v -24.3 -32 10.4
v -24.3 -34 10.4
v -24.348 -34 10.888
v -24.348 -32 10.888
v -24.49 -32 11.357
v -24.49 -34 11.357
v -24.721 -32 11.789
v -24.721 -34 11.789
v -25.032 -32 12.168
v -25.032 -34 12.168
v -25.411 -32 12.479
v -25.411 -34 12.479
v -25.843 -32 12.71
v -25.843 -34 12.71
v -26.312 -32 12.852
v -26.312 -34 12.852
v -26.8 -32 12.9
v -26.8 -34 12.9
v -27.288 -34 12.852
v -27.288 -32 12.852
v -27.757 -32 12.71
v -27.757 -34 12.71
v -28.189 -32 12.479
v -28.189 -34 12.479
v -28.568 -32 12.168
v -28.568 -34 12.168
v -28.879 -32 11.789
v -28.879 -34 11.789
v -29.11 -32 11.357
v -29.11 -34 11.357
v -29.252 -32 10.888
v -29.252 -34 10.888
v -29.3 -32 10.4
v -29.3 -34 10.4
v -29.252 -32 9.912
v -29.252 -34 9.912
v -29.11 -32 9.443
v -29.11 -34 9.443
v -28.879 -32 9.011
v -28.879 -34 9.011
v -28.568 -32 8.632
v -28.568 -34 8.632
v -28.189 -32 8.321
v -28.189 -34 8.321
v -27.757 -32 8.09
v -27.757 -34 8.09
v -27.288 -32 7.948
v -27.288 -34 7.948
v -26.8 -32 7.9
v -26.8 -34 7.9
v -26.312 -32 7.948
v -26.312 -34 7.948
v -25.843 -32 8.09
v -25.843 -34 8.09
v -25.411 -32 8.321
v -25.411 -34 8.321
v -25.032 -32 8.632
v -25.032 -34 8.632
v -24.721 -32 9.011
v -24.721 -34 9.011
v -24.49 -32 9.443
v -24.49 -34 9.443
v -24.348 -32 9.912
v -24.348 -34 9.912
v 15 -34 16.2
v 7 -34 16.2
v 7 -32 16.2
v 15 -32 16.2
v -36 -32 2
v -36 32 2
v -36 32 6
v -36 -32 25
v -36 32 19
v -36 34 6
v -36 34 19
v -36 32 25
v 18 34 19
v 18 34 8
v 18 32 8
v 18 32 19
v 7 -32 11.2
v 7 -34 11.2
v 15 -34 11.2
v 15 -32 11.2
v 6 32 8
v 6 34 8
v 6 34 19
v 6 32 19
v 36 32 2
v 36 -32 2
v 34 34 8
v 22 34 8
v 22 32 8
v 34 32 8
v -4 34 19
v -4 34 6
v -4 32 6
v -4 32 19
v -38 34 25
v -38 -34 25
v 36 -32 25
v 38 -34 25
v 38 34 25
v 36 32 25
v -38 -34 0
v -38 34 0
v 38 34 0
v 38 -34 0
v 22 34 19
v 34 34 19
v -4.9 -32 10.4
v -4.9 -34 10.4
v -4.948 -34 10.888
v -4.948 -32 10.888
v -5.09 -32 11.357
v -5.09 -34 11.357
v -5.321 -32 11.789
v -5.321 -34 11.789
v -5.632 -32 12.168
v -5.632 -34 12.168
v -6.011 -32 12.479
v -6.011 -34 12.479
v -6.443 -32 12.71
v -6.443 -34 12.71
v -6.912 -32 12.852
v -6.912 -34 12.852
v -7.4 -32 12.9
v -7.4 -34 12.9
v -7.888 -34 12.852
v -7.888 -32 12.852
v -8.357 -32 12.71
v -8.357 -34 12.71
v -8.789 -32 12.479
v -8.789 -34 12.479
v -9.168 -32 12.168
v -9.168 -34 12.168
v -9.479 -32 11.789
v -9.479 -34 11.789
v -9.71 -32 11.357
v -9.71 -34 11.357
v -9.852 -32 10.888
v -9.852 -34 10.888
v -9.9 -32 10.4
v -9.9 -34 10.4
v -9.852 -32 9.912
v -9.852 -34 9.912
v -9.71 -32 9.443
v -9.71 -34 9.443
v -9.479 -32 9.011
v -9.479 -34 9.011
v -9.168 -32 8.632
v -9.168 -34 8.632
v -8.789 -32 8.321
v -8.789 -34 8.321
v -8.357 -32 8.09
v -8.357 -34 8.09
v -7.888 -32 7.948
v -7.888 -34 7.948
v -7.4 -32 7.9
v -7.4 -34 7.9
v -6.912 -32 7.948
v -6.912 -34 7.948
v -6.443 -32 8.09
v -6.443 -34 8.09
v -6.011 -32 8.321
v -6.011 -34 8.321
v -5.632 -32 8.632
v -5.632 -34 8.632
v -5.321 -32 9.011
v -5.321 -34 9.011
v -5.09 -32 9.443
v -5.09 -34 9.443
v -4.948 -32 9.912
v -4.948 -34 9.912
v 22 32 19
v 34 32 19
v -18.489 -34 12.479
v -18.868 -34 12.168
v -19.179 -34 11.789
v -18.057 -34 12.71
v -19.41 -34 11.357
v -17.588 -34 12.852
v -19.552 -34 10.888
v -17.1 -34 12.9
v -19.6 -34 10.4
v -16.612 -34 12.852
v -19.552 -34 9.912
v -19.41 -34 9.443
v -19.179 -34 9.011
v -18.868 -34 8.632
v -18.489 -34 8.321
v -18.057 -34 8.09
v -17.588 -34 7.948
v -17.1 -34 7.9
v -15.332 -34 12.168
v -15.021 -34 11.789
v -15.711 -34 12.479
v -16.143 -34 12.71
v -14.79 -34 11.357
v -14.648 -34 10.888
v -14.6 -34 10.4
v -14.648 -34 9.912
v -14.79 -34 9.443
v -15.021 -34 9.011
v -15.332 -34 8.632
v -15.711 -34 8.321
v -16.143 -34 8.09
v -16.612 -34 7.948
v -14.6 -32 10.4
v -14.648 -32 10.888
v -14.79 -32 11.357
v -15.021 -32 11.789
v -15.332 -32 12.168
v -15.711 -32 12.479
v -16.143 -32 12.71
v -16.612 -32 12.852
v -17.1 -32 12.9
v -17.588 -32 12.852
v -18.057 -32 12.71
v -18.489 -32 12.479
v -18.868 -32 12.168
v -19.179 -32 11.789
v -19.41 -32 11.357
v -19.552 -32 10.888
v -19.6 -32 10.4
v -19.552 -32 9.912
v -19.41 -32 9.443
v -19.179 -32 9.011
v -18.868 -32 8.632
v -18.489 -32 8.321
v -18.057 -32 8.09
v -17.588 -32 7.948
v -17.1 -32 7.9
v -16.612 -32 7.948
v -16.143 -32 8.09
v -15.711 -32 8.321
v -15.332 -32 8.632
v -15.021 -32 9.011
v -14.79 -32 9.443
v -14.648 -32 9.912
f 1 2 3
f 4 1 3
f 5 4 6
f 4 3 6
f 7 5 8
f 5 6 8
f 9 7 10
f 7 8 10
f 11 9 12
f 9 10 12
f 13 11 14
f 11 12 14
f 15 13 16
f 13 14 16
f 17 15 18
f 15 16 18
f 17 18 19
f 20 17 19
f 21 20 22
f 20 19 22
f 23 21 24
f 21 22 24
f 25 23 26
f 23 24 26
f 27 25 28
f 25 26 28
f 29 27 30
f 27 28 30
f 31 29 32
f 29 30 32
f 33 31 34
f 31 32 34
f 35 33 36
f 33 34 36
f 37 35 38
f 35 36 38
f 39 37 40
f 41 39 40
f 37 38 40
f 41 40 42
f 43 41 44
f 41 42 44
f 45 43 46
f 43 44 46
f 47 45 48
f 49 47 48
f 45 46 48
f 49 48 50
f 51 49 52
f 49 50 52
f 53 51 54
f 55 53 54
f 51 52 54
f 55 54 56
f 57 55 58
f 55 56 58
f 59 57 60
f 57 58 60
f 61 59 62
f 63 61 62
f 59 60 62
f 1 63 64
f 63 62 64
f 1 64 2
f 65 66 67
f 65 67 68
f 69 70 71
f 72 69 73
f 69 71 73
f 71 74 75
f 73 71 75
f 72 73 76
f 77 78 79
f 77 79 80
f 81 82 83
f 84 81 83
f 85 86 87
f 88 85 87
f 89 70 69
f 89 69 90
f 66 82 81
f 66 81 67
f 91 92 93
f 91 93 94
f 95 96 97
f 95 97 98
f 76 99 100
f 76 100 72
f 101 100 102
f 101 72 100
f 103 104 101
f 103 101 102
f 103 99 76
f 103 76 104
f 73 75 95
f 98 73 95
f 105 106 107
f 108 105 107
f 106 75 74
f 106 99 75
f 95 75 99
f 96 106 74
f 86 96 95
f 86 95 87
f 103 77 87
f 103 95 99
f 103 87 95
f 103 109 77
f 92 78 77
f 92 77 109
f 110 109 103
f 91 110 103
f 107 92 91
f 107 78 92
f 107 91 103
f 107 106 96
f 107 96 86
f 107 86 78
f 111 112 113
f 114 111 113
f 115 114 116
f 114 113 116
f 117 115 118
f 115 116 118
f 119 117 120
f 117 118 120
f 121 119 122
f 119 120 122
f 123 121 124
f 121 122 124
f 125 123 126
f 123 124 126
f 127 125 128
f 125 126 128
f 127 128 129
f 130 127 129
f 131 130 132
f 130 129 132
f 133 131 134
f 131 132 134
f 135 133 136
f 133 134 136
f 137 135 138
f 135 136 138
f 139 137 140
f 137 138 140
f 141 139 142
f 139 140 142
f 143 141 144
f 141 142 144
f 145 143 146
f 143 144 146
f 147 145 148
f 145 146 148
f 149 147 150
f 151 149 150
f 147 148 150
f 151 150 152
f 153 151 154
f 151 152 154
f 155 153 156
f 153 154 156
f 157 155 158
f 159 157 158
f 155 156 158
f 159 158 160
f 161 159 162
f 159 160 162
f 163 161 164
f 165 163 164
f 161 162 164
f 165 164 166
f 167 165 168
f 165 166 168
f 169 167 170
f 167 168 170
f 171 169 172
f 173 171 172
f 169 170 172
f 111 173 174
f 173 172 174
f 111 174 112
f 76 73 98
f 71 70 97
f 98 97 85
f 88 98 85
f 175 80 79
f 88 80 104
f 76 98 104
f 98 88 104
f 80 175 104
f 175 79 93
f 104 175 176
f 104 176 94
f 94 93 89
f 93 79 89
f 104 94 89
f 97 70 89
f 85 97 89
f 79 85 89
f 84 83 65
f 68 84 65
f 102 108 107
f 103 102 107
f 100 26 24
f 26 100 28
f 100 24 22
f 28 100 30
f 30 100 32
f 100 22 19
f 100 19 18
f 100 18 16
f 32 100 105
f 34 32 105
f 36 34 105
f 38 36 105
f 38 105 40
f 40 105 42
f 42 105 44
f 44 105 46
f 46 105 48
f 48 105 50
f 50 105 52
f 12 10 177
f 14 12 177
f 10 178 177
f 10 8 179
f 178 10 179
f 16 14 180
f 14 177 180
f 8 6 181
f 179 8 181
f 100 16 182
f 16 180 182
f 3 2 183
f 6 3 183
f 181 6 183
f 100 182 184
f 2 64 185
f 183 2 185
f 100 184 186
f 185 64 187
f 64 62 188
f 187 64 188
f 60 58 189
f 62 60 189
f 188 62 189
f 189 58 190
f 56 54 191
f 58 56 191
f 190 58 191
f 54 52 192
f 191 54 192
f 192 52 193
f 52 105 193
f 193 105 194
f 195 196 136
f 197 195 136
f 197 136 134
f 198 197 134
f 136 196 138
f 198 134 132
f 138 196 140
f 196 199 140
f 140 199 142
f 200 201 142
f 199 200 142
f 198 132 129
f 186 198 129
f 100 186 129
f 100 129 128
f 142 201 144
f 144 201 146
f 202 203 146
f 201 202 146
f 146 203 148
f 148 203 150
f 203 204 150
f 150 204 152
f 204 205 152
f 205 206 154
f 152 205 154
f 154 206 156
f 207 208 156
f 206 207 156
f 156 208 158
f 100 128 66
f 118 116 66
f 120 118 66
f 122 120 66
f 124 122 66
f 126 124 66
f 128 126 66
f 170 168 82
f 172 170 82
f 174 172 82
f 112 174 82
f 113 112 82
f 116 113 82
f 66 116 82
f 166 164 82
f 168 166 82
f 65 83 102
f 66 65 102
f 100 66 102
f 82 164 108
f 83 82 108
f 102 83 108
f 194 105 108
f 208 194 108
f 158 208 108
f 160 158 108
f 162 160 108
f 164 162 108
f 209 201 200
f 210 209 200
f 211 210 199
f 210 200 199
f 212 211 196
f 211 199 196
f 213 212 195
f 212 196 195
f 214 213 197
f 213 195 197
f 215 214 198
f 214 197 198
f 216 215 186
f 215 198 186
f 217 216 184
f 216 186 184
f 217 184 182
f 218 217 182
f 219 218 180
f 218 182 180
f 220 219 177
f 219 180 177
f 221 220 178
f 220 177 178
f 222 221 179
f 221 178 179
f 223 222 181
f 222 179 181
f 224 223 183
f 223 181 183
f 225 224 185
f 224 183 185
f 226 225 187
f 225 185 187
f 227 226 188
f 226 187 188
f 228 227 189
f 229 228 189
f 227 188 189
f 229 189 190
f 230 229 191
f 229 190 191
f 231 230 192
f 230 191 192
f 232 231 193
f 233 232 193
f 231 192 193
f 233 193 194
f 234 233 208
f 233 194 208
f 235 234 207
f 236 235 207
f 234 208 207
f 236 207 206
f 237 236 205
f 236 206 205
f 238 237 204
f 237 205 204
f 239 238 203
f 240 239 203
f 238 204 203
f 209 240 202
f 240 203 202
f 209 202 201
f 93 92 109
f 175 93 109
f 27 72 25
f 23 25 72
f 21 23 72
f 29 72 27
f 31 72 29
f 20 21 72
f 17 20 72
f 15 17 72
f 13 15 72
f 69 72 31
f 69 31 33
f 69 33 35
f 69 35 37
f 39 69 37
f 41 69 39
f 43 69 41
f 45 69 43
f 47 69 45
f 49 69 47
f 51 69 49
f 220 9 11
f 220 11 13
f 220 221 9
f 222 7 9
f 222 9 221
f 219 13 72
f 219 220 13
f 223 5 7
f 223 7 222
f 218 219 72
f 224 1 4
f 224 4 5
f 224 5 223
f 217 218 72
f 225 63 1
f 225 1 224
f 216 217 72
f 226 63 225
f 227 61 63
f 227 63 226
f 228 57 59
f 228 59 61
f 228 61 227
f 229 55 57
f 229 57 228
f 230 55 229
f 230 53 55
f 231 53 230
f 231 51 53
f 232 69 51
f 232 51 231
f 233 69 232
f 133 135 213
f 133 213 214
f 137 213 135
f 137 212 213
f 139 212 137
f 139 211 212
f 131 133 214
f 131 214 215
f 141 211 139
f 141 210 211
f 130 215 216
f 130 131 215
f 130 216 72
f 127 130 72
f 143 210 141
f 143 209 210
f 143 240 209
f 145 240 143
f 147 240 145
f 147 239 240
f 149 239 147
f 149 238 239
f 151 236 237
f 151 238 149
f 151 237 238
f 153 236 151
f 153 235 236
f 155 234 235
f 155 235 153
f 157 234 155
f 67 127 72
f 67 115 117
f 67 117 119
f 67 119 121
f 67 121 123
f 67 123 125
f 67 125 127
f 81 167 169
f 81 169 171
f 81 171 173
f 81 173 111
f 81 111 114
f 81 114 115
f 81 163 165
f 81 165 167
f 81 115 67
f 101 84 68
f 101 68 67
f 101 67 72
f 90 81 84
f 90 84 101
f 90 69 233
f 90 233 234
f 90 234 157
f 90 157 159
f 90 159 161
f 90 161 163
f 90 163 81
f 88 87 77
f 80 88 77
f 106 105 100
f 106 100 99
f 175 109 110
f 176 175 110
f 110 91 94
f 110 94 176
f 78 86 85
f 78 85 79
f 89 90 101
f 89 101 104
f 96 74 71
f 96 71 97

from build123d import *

# Parameters (mm, degrees)
SKETCH_W        = 76
SKETCH_H        = 68
PAD_DEPTH       = 25
SKETCH001_W     = 72
SKETCH001_H     = 64
POCKET_DEPTH    = 23
SKETCH002_R     = 2.5
SKETCH002_W     = 8
SKETCH002_H     = 5
POCKET001_DEPTH = 2
SKETCH003_W     = 32
SKETCH003_H     = 13
SKETCH003_W_2   = 12
SKETCH003_H_2   = 11
POCKET002_DEPTH = 2


with BuildPart() as part:
    # Sketch → Pad (new body)
    with BuildSketch(Plane.XY):
        Rectangle(SKETCH_W, SKETCH_H)
    extrude(amount=PAD_DEPTH)

    # Sketch001 → Pocket (cut)
    with BuildSketch(Plane.XY.offset(2)):
        Rectangle(SKETCH001_W, SKETCH001_H)
    extrude(amount=POCKET_DEPTH, mode=Mode.SUBTRACT)

    # Sketch002 → Pocket001 (cut)
    with BuildSketch(Plane.XZ.offset(34)):
        with Locations((-7.4, 10.4)):
            Circle(SKETCH002_R)
        with Locations((-17.1, 10.4)):
            Circle(SKETCH002_R)
        with Locations((-26.8, 10.4)):
            Circle(SKETCH002_R)
        with Locations((11, 13.7)):
            Rectangle(SKETCH002_W, SKETCH002_H)
    extrude(amount=-POCKET001_DEPTH, mode=Mode.SUBTRACT)

    # Sketch003 → Pocket002 (cut)
    with BuildSketch(Plane.XZ.offset(-34)):
        with Locations((-20, 12.5)):
            Rectangle(SKETCH003_W, SKETCH003_H)
        with Locations((12, 13.5)):
            Rectangle(SKETCH003_W_2, SKETCH003_H_2)
        with Locations((28, 13.5)):
            Rectangle(SKETCH003_W_2, SKETCH003_H_2)
    extrude(amount=POCKET002_DEPTH, mode=Mode.SUBTRACT)


solid = part.part
